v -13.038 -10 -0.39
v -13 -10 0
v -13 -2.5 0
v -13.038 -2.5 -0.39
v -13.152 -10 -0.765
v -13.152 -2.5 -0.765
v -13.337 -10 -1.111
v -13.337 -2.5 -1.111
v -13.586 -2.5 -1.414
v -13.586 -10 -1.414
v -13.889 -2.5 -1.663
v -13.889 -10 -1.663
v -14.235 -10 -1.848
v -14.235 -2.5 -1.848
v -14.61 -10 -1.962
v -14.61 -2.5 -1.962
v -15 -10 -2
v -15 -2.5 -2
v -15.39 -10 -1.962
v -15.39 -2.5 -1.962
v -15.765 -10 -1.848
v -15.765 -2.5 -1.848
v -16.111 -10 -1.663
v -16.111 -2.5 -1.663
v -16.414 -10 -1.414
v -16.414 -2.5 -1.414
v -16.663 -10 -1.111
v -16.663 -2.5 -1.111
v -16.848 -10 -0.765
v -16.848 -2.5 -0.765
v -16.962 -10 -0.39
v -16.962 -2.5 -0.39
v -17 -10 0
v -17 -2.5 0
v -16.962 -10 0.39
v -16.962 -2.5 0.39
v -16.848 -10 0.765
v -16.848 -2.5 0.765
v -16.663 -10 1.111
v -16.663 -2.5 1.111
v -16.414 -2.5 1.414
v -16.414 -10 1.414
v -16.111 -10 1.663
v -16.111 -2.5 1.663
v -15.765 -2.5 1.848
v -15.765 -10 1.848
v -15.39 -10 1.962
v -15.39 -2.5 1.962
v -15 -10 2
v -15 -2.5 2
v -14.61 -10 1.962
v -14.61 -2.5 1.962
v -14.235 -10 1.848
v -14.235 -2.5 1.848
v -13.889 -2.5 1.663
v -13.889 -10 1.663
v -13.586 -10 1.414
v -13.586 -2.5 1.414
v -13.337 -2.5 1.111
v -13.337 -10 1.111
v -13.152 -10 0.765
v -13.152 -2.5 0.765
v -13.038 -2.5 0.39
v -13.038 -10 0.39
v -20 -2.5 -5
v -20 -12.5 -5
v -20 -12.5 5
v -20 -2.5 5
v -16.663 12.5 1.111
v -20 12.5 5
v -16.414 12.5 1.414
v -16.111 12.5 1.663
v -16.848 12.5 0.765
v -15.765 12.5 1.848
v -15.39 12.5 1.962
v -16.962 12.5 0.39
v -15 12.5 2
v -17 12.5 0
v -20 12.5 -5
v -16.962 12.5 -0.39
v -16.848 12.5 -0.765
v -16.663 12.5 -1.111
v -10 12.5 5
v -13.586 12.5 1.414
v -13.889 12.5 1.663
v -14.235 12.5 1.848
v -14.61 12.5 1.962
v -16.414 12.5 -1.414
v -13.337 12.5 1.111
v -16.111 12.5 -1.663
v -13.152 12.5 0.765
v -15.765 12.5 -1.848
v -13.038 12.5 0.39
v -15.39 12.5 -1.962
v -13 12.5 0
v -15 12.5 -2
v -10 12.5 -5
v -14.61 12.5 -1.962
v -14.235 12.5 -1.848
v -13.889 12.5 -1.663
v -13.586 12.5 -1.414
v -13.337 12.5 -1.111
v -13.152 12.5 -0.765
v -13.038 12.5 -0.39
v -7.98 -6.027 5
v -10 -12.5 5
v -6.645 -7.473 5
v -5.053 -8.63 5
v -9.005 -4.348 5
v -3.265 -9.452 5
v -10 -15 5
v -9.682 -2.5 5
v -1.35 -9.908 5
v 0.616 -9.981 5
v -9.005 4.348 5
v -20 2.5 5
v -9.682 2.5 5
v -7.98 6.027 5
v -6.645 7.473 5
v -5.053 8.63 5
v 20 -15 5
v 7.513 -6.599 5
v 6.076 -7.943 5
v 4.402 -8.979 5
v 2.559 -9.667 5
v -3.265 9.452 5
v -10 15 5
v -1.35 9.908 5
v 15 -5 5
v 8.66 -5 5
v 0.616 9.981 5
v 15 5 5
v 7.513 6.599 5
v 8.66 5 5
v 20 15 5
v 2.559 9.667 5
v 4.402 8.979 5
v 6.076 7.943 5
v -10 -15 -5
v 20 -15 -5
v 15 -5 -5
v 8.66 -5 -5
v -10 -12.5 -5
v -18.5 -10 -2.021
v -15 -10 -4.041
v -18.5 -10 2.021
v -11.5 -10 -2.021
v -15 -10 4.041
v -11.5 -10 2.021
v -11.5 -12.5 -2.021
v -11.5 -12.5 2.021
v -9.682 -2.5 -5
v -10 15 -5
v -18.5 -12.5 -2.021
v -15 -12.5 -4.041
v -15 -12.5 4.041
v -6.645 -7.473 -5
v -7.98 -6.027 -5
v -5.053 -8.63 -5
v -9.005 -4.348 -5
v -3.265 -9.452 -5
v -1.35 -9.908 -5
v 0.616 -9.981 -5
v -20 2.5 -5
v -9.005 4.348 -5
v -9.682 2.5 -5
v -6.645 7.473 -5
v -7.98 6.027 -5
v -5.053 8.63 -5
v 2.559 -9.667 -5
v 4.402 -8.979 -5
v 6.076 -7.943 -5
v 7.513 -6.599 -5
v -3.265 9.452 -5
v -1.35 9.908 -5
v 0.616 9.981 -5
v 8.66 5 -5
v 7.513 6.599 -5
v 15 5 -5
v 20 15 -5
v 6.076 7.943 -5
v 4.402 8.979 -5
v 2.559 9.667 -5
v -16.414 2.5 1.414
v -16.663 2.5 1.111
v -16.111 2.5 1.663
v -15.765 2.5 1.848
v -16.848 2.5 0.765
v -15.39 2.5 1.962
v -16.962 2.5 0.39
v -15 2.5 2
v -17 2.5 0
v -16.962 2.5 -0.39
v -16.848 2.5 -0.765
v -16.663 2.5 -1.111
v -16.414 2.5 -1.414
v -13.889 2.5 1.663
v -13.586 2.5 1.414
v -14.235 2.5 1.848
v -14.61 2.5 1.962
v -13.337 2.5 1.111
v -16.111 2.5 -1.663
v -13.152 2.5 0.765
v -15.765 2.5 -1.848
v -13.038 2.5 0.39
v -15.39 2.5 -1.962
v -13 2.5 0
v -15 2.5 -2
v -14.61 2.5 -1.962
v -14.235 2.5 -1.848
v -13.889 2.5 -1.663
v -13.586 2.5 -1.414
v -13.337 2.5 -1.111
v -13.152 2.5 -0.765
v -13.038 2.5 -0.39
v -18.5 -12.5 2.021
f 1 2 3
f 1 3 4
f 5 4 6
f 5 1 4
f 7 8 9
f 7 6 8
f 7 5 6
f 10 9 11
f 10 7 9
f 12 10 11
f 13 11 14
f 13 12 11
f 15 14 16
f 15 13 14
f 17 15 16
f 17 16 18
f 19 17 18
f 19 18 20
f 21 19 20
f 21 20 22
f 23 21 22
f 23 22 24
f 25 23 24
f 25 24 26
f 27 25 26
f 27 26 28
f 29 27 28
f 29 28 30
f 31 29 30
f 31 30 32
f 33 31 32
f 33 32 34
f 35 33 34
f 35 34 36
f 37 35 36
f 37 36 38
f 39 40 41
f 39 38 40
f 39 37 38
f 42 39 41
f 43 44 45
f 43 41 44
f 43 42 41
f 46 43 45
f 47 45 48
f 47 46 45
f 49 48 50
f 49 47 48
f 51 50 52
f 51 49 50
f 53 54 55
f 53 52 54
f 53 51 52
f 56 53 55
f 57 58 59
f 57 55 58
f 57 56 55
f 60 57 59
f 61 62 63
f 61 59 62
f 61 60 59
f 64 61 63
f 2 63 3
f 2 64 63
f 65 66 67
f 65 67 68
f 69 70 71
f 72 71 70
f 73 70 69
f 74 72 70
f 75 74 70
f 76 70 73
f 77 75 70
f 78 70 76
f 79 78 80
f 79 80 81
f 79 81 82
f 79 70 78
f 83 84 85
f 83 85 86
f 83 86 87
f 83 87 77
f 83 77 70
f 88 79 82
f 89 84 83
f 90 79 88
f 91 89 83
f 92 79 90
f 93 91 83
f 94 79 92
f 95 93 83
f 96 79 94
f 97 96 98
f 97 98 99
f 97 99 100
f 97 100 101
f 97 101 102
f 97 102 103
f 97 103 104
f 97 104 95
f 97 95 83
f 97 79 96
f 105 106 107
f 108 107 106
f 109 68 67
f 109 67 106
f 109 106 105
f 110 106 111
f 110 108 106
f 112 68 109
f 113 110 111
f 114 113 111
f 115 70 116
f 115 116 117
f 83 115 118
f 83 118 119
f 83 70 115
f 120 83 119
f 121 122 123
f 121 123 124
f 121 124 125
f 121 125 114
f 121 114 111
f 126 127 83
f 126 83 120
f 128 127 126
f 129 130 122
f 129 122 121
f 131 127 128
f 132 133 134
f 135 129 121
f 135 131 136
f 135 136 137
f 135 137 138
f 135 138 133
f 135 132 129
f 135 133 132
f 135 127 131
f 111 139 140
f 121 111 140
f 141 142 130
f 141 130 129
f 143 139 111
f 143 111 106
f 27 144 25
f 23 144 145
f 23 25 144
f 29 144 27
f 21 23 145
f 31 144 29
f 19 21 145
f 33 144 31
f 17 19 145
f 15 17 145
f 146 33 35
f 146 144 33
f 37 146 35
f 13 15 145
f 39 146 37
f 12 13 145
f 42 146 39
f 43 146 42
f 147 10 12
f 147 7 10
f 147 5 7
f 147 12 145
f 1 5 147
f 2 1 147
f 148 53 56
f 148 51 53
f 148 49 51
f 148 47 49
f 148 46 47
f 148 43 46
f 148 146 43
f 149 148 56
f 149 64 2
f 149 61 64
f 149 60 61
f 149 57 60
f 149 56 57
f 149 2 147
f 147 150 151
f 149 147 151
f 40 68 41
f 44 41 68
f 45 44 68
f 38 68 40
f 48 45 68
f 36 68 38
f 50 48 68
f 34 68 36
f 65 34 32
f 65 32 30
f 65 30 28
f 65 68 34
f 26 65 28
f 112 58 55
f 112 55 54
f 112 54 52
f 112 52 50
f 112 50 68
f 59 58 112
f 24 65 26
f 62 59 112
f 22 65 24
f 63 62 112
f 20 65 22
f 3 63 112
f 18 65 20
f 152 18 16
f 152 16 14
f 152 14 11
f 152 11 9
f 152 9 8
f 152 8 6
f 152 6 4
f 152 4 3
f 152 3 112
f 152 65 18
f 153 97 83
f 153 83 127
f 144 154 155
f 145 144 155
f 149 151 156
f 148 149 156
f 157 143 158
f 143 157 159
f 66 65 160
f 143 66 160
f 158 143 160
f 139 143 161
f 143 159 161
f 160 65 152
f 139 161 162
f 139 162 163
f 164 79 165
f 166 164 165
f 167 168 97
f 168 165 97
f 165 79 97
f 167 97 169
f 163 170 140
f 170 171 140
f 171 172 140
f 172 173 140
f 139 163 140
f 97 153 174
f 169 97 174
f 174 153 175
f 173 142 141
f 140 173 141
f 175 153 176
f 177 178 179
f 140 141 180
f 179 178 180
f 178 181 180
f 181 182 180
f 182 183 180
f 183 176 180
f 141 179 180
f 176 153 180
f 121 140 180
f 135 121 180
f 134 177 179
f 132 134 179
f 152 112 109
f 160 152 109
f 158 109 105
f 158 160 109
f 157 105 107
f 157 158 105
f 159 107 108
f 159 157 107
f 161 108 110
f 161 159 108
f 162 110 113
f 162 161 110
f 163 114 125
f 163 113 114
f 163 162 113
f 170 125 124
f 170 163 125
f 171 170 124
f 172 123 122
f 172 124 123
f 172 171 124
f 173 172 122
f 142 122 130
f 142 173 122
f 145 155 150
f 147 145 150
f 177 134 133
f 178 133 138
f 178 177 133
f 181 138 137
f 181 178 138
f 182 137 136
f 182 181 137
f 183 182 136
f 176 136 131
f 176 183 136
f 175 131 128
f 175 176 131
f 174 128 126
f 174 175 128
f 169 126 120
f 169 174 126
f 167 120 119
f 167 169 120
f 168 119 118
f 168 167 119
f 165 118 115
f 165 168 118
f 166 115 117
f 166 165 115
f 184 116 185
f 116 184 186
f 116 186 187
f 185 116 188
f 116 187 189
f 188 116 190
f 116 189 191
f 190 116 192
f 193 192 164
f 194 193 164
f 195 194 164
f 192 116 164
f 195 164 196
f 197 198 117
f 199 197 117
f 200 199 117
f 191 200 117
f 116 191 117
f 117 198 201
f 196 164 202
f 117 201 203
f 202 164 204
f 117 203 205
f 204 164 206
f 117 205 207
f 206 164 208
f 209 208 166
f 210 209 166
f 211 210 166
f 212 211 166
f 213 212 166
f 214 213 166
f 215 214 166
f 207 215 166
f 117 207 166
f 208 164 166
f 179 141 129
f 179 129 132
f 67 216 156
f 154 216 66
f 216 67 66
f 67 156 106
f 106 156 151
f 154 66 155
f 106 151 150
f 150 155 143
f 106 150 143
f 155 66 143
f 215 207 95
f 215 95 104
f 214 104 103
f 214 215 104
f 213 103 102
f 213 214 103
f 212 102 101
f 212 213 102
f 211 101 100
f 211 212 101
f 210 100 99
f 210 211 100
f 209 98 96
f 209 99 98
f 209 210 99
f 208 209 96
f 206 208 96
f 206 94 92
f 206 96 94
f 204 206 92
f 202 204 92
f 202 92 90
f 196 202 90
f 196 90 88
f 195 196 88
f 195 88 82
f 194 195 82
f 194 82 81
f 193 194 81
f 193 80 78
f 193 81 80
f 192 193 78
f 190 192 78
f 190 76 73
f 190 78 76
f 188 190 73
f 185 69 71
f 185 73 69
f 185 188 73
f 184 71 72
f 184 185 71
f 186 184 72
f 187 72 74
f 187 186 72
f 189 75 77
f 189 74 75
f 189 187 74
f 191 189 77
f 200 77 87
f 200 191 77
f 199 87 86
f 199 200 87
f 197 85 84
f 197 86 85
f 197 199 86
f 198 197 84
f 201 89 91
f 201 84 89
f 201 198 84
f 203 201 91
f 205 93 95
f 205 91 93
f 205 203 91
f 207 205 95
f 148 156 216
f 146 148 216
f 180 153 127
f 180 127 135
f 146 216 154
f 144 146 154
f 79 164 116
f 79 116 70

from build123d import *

# Parameters (mm, degrees)
CYLINDER_R             = 10
CYLINDER_DEPTH         = 10
CYLINDER001_R          = 2
CYLINDER001_DEPTH      = 30
CYLINDER001_ROLL_ANGLE = -90
BOX002_W               = 10
BOX002_H               = 2.5
BOX002_DEPTH           = 10
BOX003_W               = 10
BOX003_H               = 2.5
BOX003_DEPTH           = 10
PAD_DEPTH              = 2.5
BOX004_W               = 15
BOX004_H               = 10
BOX004_DEPTH           = 10
BOX001_W               = 15
BOX001_H               = 5
BOX001_DEPTH           = 10
BOX_W                  = 40
BOX_H                  = 30
BOX_DEPTH              = 10


with BuildPart() as cylinder:
    # Cylinder → Cylinder (new body)
    with BuildSketch(Plane.XY.offset(-5)):
        Circle(CYLINDER_R)
    extrude(amount=CYLINDER_DEPTH)


with BuildPart() as cylinder001:
    # Cylinder001 → Cylinder001 (new body)
    with BuildSketch(Plane.XY):
        Circle(CYLINDER001_R)
    extrude(amount=CYLINDER001_DEPTH)


with BuildPart() as cylinder001_1:
    # Cylinder001 roll: moved
    add(cylinder001.part.rotate(Axis((0, 0, 0), (1, 0, 0)), CYLINDER001_ROLL_ANGLE))


with BuildPart() as cylinder001_2:
    # Cylinder001 placement: moved
    add(cylinder001_1.part.moved(Location((-15, -15, 0))))


with BuildPart() as cube002:
    # Box002 → Box002 (new body)
    with BuildSketch(Plane(origin=(-20, 12.5, -5), x_dir=(1, 0, 0), z_dir=(0, 0, 1))):
        with Locations((5, 1.25)):
            Rectangle(BOX002_W, BOX002_H)
    extrude(amount=BOX002_DEPTH)


with BuildPart() as cube003:
    # Box003 → Box003 (new body)
    with BuildSketch(Plane(origin=(-20, -15, -5), x_dir=(1, 0, 0), z_dir=(0, 0, 1))):
        with Locations((5, 1.25)):
            Rectangle(BOX003_W, BOX003_H)
    extrude(amount=BOX003_DEPTH)


with BuildPart() as body:
    # Sketch → Pad (new body)
    with BuildSketch(Plane.XZ):
        Polygon((0, -4.041452), (3.5, -2.020726), (3.5, 2.020726), (0, 4.041452), (-3.5, 2.020726), (-3.5, -2.020726), align=None)
    extrude(amount=-PAD_DEPTH)


with BuildPart() as body_1:
    # Body placement: moved
    add(body.part.moved(Location((-15, -12.5, 0))))


with BuildPart() as cube004:
    # Box004 → Box004 (new body)
    with BuildSketch(Plane(origin=(0, -5, -5), x_dir=(1, 0, 0), z_dir=(0, 0, 1))):
        with Locations((7.5, 5)):
            Rectangle(BOX004_W, BOX004_H)
    extrude(amount=BOX004_DEPTH)


with BuildPart() as negative_fusion:
    # Box001 → Box001 (new body)
    with BuildSketch(Plane(origin=(-20, -2.5, -5), x_dir=(1, 0, 0), z_dir=(0, 0, 1))):
        with Locations((7.5, 2.5)):
            Rectangle(BOX001_W, BOX001_H)
    extrude(amount=BOX001_DEPTH)

    # Fusion: union Cylinder, Cylinder001, Cube002, Cube003, Body, Cube004
    add(cylinder.part)
    add(cylinder001_2.part)
    add(cube002.part)
    add(cube003.part)
    add(body_1.part)
    add(cube004.part)


with BuildPart() as cut:
    # Box → Box (new body)
    with BuildSketch(Plane(origin=(-20, -15, -5), x_dir=(1, 0, 0), z_dir=(0, 0, 1))):
        with Locations((20, 15)):
            Rectangle(BOX_W, BOX_H)
    extrude(amount=BOX_DEPTH)

    # Cut: cut Negative Fusion
    add(negative_fusion.part, mode=Mode.SUBTRACT)


solid = cut.part
